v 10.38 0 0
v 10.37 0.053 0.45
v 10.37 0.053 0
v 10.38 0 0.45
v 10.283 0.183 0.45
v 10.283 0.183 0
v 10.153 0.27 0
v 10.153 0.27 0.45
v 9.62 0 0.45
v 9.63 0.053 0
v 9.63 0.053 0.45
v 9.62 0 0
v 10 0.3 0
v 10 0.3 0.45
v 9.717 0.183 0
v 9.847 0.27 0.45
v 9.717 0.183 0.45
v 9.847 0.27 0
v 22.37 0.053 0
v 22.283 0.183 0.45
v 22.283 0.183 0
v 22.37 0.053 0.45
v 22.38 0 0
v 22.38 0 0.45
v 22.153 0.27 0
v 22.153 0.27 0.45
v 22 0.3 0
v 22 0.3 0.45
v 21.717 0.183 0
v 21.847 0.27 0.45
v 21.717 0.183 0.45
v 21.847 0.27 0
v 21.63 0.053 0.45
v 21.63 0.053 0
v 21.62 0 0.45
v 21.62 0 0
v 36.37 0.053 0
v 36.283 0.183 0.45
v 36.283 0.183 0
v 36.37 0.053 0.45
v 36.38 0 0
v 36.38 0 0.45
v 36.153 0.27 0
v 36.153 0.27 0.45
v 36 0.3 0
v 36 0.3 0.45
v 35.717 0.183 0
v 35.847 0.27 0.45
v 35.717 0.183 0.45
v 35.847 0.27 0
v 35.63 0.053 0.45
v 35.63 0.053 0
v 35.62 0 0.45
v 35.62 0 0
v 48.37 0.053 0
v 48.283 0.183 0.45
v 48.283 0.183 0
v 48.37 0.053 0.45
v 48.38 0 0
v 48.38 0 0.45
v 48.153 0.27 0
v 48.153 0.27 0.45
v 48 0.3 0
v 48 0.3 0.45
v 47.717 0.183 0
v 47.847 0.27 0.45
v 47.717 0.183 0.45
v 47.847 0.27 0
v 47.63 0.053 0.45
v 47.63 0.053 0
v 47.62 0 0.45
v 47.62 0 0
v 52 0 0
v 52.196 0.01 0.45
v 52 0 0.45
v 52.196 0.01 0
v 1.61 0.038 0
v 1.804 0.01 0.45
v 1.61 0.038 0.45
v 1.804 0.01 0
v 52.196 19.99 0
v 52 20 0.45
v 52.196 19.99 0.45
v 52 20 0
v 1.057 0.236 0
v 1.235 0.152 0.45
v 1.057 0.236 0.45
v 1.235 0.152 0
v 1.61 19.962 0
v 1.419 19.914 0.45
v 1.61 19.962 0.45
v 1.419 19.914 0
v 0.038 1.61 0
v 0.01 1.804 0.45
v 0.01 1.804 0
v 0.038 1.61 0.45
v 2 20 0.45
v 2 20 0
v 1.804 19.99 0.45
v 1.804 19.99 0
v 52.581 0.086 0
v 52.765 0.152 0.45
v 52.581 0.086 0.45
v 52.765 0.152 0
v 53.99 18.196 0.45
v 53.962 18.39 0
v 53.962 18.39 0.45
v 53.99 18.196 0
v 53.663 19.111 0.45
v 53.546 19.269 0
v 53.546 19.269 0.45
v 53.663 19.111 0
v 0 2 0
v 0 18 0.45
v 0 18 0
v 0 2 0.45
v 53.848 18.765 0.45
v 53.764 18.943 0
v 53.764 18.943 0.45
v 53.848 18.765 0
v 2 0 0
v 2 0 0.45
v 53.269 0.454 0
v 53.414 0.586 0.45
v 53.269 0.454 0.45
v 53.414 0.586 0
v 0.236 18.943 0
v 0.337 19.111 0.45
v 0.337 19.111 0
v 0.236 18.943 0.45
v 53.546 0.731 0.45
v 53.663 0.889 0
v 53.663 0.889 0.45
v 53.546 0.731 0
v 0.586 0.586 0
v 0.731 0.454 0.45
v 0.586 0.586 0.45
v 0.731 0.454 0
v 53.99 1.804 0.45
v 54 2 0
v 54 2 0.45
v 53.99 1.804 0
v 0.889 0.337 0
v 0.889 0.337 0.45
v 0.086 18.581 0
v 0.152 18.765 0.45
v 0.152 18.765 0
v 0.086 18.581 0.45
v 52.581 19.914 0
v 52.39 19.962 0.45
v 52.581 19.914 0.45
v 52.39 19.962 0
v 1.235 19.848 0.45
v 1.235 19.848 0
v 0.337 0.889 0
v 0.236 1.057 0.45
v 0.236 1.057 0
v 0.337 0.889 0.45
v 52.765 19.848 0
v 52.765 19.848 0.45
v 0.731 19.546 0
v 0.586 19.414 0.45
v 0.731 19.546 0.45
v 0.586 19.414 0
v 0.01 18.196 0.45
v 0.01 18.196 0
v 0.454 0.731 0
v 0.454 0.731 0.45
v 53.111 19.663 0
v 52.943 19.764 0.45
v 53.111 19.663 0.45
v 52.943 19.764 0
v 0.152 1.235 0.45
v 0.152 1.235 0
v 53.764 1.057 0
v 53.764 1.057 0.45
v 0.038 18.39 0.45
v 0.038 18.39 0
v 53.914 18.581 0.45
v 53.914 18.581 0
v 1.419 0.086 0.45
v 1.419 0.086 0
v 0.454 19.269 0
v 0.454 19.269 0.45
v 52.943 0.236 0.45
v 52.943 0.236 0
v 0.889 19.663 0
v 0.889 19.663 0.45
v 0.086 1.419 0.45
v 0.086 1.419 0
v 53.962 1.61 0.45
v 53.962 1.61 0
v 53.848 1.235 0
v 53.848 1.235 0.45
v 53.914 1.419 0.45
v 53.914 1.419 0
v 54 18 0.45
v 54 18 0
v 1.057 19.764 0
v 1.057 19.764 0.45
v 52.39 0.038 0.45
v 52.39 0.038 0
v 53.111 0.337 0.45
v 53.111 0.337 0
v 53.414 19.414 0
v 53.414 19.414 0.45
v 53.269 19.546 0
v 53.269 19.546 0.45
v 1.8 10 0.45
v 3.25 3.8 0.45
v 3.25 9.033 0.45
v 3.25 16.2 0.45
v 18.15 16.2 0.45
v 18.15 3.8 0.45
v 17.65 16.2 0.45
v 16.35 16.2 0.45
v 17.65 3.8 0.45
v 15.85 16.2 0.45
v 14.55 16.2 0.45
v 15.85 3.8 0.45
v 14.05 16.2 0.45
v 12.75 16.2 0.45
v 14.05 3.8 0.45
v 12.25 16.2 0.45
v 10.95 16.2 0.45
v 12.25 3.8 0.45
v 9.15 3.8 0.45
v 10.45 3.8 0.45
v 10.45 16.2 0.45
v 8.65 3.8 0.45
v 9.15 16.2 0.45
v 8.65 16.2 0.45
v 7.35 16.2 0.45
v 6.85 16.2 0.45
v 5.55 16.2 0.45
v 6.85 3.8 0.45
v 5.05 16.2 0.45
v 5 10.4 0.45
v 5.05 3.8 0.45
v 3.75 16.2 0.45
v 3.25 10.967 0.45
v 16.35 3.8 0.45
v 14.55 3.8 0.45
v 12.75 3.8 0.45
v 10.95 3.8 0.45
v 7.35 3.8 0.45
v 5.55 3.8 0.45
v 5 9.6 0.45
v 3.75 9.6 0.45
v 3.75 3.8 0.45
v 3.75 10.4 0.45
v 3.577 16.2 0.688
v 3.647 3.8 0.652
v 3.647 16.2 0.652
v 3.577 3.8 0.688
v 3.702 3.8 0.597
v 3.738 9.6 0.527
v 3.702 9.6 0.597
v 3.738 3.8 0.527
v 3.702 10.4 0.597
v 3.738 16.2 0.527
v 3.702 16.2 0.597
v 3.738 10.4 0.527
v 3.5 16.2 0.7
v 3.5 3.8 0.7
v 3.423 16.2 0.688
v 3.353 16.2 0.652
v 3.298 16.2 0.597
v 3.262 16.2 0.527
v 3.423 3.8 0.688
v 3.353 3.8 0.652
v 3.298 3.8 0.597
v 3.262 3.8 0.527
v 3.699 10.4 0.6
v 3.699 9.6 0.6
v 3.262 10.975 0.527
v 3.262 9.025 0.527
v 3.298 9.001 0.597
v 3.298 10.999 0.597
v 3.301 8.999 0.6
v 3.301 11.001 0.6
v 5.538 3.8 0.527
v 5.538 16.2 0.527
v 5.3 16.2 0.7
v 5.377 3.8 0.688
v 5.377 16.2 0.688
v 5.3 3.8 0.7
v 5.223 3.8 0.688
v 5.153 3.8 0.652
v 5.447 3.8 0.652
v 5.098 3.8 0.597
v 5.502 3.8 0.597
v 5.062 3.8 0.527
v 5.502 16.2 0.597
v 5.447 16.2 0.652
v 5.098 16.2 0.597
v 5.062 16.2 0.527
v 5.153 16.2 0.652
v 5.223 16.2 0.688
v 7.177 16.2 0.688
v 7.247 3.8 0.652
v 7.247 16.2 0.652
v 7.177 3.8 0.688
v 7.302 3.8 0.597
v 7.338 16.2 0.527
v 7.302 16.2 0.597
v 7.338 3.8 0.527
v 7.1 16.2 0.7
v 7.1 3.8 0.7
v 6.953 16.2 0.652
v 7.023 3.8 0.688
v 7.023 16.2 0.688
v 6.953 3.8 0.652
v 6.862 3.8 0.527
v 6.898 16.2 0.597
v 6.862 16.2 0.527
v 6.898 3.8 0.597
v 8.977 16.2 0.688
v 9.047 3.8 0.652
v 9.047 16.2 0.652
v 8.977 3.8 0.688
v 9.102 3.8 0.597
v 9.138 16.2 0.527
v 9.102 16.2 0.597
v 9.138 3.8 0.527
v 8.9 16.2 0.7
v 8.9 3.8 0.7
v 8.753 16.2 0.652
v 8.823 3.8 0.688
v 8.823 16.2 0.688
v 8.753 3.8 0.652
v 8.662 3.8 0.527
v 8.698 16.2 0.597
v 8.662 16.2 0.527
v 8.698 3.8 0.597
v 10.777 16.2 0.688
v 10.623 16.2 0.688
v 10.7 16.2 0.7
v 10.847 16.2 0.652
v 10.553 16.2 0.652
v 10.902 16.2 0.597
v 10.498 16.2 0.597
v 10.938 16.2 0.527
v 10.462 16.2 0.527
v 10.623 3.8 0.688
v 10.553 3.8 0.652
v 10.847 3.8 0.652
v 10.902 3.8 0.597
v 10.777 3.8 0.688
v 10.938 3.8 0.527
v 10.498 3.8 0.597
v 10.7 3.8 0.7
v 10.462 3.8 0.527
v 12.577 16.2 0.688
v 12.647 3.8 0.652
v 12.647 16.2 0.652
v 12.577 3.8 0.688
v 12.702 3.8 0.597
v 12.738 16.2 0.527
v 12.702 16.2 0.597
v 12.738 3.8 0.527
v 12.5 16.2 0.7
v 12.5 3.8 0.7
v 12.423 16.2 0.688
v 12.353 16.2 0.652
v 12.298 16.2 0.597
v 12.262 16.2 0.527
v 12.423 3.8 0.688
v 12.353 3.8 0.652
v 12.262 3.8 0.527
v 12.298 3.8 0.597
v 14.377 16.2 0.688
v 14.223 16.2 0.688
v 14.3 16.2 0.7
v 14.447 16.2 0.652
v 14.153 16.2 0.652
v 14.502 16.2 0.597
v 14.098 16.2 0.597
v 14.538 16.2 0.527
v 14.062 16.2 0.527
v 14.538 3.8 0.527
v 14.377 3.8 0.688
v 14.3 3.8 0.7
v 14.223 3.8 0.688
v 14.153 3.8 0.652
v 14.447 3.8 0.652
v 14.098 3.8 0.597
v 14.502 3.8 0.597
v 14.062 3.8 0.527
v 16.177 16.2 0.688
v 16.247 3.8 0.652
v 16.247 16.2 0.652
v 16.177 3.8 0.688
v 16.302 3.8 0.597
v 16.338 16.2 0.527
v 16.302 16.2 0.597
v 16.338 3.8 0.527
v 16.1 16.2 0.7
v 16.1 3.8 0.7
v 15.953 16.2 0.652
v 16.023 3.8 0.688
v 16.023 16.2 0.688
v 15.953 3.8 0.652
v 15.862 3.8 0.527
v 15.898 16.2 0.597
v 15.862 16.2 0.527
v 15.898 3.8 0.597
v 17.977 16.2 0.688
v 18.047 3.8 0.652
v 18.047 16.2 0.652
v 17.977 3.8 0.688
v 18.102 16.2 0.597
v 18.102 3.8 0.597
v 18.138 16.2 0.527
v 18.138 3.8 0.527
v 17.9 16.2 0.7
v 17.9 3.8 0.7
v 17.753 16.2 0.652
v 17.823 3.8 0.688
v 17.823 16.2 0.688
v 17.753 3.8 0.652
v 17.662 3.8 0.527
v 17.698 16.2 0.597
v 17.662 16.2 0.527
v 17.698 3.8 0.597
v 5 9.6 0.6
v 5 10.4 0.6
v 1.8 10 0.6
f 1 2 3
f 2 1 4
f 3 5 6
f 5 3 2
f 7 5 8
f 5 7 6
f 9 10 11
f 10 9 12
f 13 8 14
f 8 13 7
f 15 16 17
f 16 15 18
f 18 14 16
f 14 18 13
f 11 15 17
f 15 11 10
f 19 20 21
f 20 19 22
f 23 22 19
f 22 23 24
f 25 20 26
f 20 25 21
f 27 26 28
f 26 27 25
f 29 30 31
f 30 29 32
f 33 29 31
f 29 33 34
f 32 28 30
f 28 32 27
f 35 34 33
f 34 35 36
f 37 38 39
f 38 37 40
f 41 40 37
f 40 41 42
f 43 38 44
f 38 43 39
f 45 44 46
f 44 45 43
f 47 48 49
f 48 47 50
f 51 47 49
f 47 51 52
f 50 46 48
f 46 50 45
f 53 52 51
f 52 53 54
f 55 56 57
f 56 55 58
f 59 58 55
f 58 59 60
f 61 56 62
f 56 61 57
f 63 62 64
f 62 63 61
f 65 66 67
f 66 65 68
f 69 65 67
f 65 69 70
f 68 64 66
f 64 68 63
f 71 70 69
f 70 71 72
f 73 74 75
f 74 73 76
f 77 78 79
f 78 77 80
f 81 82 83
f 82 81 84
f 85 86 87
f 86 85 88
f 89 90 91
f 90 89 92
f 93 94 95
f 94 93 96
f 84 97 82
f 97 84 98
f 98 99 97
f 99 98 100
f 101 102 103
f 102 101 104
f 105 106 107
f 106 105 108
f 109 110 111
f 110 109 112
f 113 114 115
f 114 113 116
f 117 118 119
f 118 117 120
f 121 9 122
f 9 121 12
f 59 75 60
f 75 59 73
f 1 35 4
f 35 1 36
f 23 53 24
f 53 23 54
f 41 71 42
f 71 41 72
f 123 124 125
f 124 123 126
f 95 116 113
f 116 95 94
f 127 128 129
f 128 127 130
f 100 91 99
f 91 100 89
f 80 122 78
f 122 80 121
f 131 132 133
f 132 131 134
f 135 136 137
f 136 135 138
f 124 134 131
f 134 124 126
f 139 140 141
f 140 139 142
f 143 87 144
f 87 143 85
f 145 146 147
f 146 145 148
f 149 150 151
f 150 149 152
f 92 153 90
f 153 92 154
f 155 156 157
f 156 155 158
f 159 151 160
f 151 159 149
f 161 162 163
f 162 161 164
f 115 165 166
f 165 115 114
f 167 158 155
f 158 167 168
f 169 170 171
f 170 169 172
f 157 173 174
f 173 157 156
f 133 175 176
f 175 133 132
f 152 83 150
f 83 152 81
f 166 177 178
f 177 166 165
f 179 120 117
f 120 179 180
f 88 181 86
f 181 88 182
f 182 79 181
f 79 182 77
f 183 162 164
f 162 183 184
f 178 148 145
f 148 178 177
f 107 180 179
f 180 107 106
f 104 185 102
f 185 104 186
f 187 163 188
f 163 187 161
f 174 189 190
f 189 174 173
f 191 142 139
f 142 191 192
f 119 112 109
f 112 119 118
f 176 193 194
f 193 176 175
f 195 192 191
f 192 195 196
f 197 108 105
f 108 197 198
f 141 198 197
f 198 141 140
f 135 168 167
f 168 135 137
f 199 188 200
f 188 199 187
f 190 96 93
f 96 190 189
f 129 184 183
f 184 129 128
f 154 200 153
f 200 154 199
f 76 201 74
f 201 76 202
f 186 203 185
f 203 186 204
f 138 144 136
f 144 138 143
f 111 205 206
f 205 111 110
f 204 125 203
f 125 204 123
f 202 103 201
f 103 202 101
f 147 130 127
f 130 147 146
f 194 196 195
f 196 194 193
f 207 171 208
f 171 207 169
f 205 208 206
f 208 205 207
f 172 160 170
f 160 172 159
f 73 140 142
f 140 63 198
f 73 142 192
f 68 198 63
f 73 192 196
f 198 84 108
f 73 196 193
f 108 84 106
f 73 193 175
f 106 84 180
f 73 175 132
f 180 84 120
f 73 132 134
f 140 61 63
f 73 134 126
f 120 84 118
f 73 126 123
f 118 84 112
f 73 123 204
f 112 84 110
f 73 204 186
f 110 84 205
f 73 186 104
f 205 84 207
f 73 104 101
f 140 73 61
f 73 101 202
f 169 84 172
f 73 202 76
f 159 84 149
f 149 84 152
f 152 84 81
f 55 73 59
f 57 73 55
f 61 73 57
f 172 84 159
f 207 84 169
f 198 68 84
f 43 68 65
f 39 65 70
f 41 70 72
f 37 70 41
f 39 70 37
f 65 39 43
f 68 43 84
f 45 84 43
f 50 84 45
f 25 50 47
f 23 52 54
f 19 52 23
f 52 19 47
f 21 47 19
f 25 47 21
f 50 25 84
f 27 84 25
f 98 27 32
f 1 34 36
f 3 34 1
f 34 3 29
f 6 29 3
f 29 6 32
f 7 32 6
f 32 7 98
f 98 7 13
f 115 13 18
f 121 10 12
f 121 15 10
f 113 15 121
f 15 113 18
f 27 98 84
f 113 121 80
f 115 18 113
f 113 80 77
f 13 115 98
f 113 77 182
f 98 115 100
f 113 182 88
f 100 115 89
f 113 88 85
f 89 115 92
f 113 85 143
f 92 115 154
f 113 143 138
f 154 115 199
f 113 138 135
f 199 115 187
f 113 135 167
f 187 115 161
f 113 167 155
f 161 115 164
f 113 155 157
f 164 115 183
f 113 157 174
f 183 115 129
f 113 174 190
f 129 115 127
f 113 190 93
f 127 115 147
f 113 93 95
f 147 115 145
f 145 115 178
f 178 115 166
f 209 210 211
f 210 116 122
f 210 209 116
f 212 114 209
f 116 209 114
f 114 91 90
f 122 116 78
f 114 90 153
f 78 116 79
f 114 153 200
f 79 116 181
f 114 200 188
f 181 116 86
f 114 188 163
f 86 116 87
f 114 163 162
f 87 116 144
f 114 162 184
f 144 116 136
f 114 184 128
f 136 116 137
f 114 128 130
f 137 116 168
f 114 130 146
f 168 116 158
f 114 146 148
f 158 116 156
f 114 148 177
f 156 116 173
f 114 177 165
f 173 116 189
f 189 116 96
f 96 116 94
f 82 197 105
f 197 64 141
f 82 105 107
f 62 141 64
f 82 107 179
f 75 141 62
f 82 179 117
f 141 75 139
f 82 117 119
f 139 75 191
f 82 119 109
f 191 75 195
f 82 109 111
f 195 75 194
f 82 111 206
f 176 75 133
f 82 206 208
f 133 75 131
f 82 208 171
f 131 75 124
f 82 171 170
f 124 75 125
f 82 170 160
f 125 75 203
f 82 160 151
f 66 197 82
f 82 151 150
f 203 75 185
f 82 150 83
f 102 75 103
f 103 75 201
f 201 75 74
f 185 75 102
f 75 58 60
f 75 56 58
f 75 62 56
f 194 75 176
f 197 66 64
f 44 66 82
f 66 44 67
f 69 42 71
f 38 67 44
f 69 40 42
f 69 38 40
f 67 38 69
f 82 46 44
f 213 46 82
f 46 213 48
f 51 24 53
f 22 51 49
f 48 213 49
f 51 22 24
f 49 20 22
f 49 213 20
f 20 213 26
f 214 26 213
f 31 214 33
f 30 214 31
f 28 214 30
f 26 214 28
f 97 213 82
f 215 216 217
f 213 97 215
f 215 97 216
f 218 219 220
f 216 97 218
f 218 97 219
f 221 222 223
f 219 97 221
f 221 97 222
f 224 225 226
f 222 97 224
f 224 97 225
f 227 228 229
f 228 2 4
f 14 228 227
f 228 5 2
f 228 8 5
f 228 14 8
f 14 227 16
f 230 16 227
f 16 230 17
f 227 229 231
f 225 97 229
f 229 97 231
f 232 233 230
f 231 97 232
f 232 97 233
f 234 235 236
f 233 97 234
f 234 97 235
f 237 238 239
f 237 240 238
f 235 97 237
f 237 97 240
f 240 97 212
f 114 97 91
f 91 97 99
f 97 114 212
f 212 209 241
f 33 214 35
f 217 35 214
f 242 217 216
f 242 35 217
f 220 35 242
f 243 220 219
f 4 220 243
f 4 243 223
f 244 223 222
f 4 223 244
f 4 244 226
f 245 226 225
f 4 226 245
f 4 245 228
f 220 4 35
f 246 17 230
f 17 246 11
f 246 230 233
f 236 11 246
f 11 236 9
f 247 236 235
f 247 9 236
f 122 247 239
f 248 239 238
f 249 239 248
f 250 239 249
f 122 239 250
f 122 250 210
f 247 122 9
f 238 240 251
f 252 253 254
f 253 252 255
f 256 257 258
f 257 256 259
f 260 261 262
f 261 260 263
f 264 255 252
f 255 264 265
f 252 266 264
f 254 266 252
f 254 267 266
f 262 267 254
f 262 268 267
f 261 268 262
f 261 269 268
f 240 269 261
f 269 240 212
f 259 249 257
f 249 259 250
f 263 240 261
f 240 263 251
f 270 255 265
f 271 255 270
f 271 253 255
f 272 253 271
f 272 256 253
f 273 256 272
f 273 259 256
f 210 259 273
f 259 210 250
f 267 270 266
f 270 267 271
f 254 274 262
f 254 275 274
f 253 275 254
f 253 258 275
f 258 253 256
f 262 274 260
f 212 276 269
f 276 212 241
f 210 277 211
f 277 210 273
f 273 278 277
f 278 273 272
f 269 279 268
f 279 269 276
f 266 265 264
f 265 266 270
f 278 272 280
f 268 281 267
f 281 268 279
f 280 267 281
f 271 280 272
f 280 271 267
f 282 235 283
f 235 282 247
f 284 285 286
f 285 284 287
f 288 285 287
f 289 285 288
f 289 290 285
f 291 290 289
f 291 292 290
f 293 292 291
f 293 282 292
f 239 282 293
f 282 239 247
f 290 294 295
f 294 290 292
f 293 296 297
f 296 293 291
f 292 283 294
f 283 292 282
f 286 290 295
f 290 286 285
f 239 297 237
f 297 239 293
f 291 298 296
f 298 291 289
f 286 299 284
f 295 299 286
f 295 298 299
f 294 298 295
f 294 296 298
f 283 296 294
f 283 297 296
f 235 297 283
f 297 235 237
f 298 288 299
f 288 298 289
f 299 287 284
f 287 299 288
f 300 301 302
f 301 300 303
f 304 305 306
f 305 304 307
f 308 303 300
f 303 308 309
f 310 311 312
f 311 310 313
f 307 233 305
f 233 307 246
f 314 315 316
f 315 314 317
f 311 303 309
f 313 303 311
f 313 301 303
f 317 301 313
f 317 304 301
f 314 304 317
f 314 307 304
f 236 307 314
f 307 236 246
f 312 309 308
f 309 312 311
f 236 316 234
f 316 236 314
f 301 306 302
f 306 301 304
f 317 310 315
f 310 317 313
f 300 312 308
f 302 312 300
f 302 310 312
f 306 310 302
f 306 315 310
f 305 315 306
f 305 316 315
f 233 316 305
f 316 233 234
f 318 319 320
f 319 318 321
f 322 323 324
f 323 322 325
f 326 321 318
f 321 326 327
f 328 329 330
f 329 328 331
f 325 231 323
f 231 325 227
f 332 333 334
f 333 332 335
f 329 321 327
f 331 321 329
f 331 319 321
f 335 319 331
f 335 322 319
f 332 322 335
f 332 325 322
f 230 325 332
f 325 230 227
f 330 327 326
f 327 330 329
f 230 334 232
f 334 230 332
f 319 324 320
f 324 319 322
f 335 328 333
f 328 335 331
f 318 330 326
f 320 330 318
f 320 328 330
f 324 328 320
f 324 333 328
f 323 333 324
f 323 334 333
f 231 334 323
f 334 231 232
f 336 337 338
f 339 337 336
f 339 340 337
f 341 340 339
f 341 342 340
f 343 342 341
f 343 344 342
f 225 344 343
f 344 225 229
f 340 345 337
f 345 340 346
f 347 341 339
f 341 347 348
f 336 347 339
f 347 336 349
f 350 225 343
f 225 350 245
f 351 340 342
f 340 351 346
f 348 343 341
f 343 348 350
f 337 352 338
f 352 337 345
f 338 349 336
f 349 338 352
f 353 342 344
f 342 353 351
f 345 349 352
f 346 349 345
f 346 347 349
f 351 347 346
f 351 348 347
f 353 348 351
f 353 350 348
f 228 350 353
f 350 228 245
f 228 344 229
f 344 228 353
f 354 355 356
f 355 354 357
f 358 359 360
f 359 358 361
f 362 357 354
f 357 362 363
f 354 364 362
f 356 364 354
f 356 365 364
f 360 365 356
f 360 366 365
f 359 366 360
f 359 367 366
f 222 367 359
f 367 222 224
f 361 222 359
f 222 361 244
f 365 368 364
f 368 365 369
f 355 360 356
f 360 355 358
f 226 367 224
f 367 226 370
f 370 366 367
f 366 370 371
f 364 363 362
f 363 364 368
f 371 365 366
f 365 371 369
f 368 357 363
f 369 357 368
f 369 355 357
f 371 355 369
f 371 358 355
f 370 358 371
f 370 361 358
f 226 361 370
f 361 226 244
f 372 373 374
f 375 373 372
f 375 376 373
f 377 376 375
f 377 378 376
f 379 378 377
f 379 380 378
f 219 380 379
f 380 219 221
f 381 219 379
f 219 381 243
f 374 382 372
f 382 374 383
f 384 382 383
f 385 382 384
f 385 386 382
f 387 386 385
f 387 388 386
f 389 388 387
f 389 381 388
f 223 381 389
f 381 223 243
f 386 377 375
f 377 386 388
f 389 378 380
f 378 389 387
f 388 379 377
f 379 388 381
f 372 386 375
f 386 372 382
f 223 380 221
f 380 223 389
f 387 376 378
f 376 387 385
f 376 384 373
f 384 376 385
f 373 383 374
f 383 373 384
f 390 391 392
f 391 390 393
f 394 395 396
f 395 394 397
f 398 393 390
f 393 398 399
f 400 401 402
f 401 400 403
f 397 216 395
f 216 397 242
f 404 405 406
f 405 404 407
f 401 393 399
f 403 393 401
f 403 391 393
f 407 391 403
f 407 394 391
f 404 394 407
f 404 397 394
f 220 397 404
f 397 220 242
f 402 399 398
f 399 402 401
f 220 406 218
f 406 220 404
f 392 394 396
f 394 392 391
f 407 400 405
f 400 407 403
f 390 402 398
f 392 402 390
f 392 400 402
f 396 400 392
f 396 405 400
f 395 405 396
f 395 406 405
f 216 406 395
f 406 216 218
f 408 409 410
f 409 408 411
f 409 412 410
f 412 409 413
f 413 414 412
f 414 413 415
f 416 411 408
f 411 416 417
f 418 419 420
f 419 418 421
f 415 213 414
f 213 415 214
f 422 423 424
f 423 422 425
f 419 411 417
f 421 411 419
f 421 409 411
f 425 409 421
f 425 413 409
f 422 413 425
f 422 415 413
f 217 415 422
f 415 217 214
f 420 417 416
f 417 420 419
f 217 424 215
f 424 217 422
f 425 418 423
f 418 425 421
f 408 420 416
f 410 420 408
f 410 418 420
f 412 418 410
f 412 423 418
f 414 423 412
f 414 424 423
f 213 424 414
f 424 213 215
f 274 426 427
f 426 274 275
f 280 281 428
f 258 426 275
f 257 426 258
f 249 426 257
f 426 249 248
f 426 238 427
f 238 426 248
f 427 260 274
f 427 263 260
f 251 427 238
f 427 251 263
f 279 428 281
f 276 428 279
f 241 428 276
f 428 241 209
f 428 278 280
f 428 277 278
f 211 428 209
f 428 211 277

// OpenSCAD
// file: ../Common/params.scad
// =========================================================================
// PencilAI - Common Parameters, Colors & Utility Library
// File: CAD Modelling/Common/params.scad
// =========================================================================

// --- Resolution Settings ---
$fn = 64;

// --- Physical Strip Dimensions (mm) ---
STRIP_LEN        = 54.0;   // Length of flexible tape (wraps ~1.9x on 9mm barrel)
STRIP_WID        = 20.0;   // Width of tape along the pen axis (grip zone height)
STRIP_CORNER_R   = 2.0;    // Rounded corner radius to prevent peeling

// --- Layer Heights & Z-Stackup (mm) ---
THICK_ADHESIVE   = 0.055;  // Skin-safe medical acrylic adhesive
THICK_KAPTON     = 0.025;  // Flexible Polyimide film substrate (25 um)
THICK_BASE       = THICK_ADHESIVE + THICK_KAPTON; // 0.080 mm base

THICK_COPPER     = 0.020;  // Etched copper traces (1/2 oz / 18-20 um)
THICK_GOLD       = 0.005;  // ENIG surface finish plating
THICK_CARBON     = 0.030;  // Screen-printed carbon resistive ink (30 um)
THICK_SPACER     = 0.015;  // Dielectric spacer dot height

THICK_TPU_SKIN   = 0.450;  // Translucent matte TPU outer protective grip film
THICK_TOTAL_MAX  = 0.530;  // Target total profile thickness: 0.53 mm

// --- Component Dimensions (mm) ---
// ST LIS2DH12 Ultra-low-power 3-axis accelerometer (WLCSP-12)
ACCEL_LEN        = 1.60;
ACCEL_WID        = 1.60;
ACCEL_H          = 0.40;   // Ultra-thin WLCSP package
ACCEL_BALL_PITCH = 0.40;   // 3x4 solder ball matrix
ACCEL_BALL_DIA   = 0.22;

// BLE Beacon SoC (InPlay IN100 / Nordic nRF52810 WLCSP)
BLE_LEN          = 2.20;
BLE_WID          = 2.20;
BLE_H            = 0.35;   // 0.35 mm profile
BLE_BALL_PITCH   = 0.45;   // 4x4 solder ball matrix
BLE_BALL_DIA     = 0.24;

// Ultra-Thin Printed Zinc-Manganese (Zn-Mn) Flexible Battery
BAT_LEN          = 16.5;   // Main pouch length
BAT_WID          = 12.6;   // Main pouch width
BAT_H            = 0.45;   // Printed paper battery thickness (0.45 mm)
BAT_SEAL_MARGIN  = 1.0;    // Perimeter foil crimp seal width
BAT_TAB_LEN      = 2.4;    // Terminal connector tab length
BAT_TAB_WID      = 1.2;    // Terminal tab width

// Interdigitated Carbon FSR Pinch Zone
FSR_LEN          = 17.5;
FSR_WID          = 13.6;
FSR_FINGERS      = 16;
FSR_BUS_WID      = 0.60;

// Serpentine 2.4 GHz Antenna
ANT_LOOPS        = 6;
ANT_STEP         = 1.40;
ANT_AMP          = 2.40;
ANT_TRACE_WID    = 0.35;

// Reference Pen
PEN_DIAMETER_DEFAULT = 9.0; // Standard ballpoint barrel (mm)

// --- Color Palette (RGBA) ---
C_KAPTON         = [0.85, 0.48, 0.08, 0.88]; // Translucent Amber Polyimide
C_ADHESIVE       = [0.95, 0.95, 0.92, 0.50]; // Clear skin-safe acrylic adhesive
C_RELEASE_LINER  = [0.98, 0.98, 0.96, 0.95]; // White silicone-coated pull tab
C_TPU_SKIN       = [0.18, 0.19, 0.22, 0.55]; // Translucent Charcoal Matte TPU
C_TPU_OPAQUE     = [0.14, 0.15, 0.17, 1.00]; // Grip ridges / tactile accents
C_COPPER         = [0.85, 0.45, 0.22, 1.00]; // Raw Etched Copper
C_GOLD           = [0.92, 0.74, 0.20, 1.00]; // ENIG Gold Plating
C_CARBON         = [0.12, 0.12, 0.13, 0.98]; // Screen-Printed Carbon Ink
C_DIELECTRIC     = [0.20, 0.65, 0.40, 0.75]; // Green/Teal Dielectric Spacer
C_SILICON        = [0.09, 0.10, 0.12, 1.00]; // WLCSP Mirror Silicon Die
C_SOLDER         = [0.76, 0.78, 0.82, 1.00]; // SAC305 Lead-Free Solder
C_CERAMIC        = [0.70, 0.58, 0.46, 1.00]; // 0201 MLCC Brown Ceramic
C_BATTERY_FOIL   = [0.80, 0.82, 0.85, 1.00]; // Hermetic Aluminum/Poly Pouch
C_BATTERY_SEAL   = [0.65, 0.67, 0.70, 1.00]; // Crimped Pouch Flange
C_BAT_ACCENT     = [0.15, 0.45, 0.75, 1.00]; // Insulator Layer / Branding
C_PEN_BARREL     = [0.93, 0.94, 0.96, 0.90]; // Smooth Polycarbonate Barrel
C_PEN_CHROME     = [0.84, 0.86, 0.89, 1.00]; // Mirror Chrome Trim
C_PEN_BRASS      = [0.86, 0.70, 0.28, 1.00]; // Machined Brass Tip Collar
C_PEN_BALL       = [0.35, 0.36, 0.38, 1.00]; // Tungsten Carbide Ball
C_PEN_INK        = [0.05, 0.10, 0.35, 1.00]; // Blue Ink Column inside refill

// --- Reusable Geometric Modules ---

// 2D Rounded Rectangle (Centered or Corner Origin)
module rounded_rect_2d(length, width, radius, center = false) {
    tx = center ? -length / 2 : 0;
    ty = center ? -width / 2 : 0;
    translate([tx, ty])
        offset(r = radius)
            offset(delta = -radius)
                square([length, width]);
}

// 3D Rounded Extruded Plate
module rounded_box(length, width, height, radius, center = false) {
    linear_extrude(height = height)
        rounded_rect_2d(length, width, radius, center = center);
}

// Spherical Solder Ball
module solder_ball(diameter) {
    color(C_SOLDER)
        sphere(d = diameter, $fn = 32);
}

// SMD 0201 / 01005 Passive Component (Capacitor / Inductor / Resistor)
module smd_passive_0201(len = 0.60, wid = 0.30, height = 0.30, body_color = C_CERAMIC) {
    term_len = 0.15;
    // Central Ceramic/Ferrite Body
    color(body_color)
        translate([term_len, 0, 0])
            cube([len - 2 * term_len, wid, height]);
    // Silver End Terminations
    color(C_SOLDER) {
        cube([term_len, wid, height]);
        translate([len - term_len, 0, 0])
            cube([term_len, wid, height]);
    }
}

// Circular Fiducial Alignment Marker (for high-precision flex assembly)
module fiducial_marker(diameter = 1.0, copper_h = THICK_COPPER) {
    color(C_GOLD)
        cylinder(d = diameter, h = copper_h, $fn = 32);
    color(C_KAPTON)
        difference() {
            cylinder(d = diameter * 2.2, h = copper_h + 0.001, $fn = 32);
            cylinder(d = diameter * 1.4, h = copper_h + 0.002, $fn = 32);
        }
}
// main file
// =========================================================================
// PencilAI - Translucent Matte TPU Protective Grip Skin
// File: CAD Modelling/Enclosure/tpu_grip_skin.scad
// =========================================================================

include <../Common/params.scad>

// --- View Controls (when rendered directly) ---
show_grip_ribs    = true;   // Tactile micro-rib ridges over finger pinch zone
show_strain_relief = true;  // Lateral flex relief notches for tight barrel wrapping
x_ray_mode        = false;  // Make skin high-transparency to inspect underlying components
skin_opacity      = x_ray_mode ? 0.25 : 0.55;

module tpu_skin(
    x = 0,
    y = 0,
    z = THICK_BASE,
    length = STRIP_LEN,
    width = STRIP_WID,
    thickness = THICK_TPU_SKIN
) {
    c_skin = [C_TPU_SKIN[0], C_TPU_SKIN[1], C_TPU_SKIN[2], skin_opacity];

    translate([x, y, z]) {
        // 1. Main Matte TPU Protective Film
        color(c_skin) {
            difference() {
                // Base rounded encapsulation cover
                rounded_box(length, width, thickness, STRIP_CORNER_R);

                // Strain relief notches along the bottom edge to allow smooth conical conformity
                if (show_strain_relief) {
                    for (nx = [10.0, 22.0, 36.0, 48.0]) {
                        translate([nx, -0.1, -0.01])
                            cylinder(d = 0.8, h = thickness + 0.02, $fn = 16);
                    }
                }
            }
        }

        // 2. Tactile Ergonomic Micro-Ribs (Finger Traction Zone)
        // Positioned directly over the FSR finger grip zone (x = 3.0 to 19.0)
        if (show_grip_ribs) {
            color(C_TPU_OPAQUE) {
                for (rx = [3.5 : 1.8 : 19.5]) {
                    translate([rx, 3.8, thickness]) {
                        // Ergonomic rounded raised ridge
                        rotate([-90, 0, 0])
                            cylinder(r = 0.25, h = 12.4, $fn = 20);
                    }
                }

                // Tactile Nib Direction Indicator Arrow
                translate([1.8, 10.0, thickness]) {
                    linear_extrude(height = 0.15) {
                        polygon(points = [
                            [0, 0], [1.8, -1.2], [1.8, -0.4], [3.2, -0.4],
                            [3.2, 0.4], [1.8, 0.4], [1.8, 1.2]
                        ]);
                    }
                }
            }
        }
    }
}

// Standalone Render
tpu_skin(x = 0, y = 0, z = 0);
